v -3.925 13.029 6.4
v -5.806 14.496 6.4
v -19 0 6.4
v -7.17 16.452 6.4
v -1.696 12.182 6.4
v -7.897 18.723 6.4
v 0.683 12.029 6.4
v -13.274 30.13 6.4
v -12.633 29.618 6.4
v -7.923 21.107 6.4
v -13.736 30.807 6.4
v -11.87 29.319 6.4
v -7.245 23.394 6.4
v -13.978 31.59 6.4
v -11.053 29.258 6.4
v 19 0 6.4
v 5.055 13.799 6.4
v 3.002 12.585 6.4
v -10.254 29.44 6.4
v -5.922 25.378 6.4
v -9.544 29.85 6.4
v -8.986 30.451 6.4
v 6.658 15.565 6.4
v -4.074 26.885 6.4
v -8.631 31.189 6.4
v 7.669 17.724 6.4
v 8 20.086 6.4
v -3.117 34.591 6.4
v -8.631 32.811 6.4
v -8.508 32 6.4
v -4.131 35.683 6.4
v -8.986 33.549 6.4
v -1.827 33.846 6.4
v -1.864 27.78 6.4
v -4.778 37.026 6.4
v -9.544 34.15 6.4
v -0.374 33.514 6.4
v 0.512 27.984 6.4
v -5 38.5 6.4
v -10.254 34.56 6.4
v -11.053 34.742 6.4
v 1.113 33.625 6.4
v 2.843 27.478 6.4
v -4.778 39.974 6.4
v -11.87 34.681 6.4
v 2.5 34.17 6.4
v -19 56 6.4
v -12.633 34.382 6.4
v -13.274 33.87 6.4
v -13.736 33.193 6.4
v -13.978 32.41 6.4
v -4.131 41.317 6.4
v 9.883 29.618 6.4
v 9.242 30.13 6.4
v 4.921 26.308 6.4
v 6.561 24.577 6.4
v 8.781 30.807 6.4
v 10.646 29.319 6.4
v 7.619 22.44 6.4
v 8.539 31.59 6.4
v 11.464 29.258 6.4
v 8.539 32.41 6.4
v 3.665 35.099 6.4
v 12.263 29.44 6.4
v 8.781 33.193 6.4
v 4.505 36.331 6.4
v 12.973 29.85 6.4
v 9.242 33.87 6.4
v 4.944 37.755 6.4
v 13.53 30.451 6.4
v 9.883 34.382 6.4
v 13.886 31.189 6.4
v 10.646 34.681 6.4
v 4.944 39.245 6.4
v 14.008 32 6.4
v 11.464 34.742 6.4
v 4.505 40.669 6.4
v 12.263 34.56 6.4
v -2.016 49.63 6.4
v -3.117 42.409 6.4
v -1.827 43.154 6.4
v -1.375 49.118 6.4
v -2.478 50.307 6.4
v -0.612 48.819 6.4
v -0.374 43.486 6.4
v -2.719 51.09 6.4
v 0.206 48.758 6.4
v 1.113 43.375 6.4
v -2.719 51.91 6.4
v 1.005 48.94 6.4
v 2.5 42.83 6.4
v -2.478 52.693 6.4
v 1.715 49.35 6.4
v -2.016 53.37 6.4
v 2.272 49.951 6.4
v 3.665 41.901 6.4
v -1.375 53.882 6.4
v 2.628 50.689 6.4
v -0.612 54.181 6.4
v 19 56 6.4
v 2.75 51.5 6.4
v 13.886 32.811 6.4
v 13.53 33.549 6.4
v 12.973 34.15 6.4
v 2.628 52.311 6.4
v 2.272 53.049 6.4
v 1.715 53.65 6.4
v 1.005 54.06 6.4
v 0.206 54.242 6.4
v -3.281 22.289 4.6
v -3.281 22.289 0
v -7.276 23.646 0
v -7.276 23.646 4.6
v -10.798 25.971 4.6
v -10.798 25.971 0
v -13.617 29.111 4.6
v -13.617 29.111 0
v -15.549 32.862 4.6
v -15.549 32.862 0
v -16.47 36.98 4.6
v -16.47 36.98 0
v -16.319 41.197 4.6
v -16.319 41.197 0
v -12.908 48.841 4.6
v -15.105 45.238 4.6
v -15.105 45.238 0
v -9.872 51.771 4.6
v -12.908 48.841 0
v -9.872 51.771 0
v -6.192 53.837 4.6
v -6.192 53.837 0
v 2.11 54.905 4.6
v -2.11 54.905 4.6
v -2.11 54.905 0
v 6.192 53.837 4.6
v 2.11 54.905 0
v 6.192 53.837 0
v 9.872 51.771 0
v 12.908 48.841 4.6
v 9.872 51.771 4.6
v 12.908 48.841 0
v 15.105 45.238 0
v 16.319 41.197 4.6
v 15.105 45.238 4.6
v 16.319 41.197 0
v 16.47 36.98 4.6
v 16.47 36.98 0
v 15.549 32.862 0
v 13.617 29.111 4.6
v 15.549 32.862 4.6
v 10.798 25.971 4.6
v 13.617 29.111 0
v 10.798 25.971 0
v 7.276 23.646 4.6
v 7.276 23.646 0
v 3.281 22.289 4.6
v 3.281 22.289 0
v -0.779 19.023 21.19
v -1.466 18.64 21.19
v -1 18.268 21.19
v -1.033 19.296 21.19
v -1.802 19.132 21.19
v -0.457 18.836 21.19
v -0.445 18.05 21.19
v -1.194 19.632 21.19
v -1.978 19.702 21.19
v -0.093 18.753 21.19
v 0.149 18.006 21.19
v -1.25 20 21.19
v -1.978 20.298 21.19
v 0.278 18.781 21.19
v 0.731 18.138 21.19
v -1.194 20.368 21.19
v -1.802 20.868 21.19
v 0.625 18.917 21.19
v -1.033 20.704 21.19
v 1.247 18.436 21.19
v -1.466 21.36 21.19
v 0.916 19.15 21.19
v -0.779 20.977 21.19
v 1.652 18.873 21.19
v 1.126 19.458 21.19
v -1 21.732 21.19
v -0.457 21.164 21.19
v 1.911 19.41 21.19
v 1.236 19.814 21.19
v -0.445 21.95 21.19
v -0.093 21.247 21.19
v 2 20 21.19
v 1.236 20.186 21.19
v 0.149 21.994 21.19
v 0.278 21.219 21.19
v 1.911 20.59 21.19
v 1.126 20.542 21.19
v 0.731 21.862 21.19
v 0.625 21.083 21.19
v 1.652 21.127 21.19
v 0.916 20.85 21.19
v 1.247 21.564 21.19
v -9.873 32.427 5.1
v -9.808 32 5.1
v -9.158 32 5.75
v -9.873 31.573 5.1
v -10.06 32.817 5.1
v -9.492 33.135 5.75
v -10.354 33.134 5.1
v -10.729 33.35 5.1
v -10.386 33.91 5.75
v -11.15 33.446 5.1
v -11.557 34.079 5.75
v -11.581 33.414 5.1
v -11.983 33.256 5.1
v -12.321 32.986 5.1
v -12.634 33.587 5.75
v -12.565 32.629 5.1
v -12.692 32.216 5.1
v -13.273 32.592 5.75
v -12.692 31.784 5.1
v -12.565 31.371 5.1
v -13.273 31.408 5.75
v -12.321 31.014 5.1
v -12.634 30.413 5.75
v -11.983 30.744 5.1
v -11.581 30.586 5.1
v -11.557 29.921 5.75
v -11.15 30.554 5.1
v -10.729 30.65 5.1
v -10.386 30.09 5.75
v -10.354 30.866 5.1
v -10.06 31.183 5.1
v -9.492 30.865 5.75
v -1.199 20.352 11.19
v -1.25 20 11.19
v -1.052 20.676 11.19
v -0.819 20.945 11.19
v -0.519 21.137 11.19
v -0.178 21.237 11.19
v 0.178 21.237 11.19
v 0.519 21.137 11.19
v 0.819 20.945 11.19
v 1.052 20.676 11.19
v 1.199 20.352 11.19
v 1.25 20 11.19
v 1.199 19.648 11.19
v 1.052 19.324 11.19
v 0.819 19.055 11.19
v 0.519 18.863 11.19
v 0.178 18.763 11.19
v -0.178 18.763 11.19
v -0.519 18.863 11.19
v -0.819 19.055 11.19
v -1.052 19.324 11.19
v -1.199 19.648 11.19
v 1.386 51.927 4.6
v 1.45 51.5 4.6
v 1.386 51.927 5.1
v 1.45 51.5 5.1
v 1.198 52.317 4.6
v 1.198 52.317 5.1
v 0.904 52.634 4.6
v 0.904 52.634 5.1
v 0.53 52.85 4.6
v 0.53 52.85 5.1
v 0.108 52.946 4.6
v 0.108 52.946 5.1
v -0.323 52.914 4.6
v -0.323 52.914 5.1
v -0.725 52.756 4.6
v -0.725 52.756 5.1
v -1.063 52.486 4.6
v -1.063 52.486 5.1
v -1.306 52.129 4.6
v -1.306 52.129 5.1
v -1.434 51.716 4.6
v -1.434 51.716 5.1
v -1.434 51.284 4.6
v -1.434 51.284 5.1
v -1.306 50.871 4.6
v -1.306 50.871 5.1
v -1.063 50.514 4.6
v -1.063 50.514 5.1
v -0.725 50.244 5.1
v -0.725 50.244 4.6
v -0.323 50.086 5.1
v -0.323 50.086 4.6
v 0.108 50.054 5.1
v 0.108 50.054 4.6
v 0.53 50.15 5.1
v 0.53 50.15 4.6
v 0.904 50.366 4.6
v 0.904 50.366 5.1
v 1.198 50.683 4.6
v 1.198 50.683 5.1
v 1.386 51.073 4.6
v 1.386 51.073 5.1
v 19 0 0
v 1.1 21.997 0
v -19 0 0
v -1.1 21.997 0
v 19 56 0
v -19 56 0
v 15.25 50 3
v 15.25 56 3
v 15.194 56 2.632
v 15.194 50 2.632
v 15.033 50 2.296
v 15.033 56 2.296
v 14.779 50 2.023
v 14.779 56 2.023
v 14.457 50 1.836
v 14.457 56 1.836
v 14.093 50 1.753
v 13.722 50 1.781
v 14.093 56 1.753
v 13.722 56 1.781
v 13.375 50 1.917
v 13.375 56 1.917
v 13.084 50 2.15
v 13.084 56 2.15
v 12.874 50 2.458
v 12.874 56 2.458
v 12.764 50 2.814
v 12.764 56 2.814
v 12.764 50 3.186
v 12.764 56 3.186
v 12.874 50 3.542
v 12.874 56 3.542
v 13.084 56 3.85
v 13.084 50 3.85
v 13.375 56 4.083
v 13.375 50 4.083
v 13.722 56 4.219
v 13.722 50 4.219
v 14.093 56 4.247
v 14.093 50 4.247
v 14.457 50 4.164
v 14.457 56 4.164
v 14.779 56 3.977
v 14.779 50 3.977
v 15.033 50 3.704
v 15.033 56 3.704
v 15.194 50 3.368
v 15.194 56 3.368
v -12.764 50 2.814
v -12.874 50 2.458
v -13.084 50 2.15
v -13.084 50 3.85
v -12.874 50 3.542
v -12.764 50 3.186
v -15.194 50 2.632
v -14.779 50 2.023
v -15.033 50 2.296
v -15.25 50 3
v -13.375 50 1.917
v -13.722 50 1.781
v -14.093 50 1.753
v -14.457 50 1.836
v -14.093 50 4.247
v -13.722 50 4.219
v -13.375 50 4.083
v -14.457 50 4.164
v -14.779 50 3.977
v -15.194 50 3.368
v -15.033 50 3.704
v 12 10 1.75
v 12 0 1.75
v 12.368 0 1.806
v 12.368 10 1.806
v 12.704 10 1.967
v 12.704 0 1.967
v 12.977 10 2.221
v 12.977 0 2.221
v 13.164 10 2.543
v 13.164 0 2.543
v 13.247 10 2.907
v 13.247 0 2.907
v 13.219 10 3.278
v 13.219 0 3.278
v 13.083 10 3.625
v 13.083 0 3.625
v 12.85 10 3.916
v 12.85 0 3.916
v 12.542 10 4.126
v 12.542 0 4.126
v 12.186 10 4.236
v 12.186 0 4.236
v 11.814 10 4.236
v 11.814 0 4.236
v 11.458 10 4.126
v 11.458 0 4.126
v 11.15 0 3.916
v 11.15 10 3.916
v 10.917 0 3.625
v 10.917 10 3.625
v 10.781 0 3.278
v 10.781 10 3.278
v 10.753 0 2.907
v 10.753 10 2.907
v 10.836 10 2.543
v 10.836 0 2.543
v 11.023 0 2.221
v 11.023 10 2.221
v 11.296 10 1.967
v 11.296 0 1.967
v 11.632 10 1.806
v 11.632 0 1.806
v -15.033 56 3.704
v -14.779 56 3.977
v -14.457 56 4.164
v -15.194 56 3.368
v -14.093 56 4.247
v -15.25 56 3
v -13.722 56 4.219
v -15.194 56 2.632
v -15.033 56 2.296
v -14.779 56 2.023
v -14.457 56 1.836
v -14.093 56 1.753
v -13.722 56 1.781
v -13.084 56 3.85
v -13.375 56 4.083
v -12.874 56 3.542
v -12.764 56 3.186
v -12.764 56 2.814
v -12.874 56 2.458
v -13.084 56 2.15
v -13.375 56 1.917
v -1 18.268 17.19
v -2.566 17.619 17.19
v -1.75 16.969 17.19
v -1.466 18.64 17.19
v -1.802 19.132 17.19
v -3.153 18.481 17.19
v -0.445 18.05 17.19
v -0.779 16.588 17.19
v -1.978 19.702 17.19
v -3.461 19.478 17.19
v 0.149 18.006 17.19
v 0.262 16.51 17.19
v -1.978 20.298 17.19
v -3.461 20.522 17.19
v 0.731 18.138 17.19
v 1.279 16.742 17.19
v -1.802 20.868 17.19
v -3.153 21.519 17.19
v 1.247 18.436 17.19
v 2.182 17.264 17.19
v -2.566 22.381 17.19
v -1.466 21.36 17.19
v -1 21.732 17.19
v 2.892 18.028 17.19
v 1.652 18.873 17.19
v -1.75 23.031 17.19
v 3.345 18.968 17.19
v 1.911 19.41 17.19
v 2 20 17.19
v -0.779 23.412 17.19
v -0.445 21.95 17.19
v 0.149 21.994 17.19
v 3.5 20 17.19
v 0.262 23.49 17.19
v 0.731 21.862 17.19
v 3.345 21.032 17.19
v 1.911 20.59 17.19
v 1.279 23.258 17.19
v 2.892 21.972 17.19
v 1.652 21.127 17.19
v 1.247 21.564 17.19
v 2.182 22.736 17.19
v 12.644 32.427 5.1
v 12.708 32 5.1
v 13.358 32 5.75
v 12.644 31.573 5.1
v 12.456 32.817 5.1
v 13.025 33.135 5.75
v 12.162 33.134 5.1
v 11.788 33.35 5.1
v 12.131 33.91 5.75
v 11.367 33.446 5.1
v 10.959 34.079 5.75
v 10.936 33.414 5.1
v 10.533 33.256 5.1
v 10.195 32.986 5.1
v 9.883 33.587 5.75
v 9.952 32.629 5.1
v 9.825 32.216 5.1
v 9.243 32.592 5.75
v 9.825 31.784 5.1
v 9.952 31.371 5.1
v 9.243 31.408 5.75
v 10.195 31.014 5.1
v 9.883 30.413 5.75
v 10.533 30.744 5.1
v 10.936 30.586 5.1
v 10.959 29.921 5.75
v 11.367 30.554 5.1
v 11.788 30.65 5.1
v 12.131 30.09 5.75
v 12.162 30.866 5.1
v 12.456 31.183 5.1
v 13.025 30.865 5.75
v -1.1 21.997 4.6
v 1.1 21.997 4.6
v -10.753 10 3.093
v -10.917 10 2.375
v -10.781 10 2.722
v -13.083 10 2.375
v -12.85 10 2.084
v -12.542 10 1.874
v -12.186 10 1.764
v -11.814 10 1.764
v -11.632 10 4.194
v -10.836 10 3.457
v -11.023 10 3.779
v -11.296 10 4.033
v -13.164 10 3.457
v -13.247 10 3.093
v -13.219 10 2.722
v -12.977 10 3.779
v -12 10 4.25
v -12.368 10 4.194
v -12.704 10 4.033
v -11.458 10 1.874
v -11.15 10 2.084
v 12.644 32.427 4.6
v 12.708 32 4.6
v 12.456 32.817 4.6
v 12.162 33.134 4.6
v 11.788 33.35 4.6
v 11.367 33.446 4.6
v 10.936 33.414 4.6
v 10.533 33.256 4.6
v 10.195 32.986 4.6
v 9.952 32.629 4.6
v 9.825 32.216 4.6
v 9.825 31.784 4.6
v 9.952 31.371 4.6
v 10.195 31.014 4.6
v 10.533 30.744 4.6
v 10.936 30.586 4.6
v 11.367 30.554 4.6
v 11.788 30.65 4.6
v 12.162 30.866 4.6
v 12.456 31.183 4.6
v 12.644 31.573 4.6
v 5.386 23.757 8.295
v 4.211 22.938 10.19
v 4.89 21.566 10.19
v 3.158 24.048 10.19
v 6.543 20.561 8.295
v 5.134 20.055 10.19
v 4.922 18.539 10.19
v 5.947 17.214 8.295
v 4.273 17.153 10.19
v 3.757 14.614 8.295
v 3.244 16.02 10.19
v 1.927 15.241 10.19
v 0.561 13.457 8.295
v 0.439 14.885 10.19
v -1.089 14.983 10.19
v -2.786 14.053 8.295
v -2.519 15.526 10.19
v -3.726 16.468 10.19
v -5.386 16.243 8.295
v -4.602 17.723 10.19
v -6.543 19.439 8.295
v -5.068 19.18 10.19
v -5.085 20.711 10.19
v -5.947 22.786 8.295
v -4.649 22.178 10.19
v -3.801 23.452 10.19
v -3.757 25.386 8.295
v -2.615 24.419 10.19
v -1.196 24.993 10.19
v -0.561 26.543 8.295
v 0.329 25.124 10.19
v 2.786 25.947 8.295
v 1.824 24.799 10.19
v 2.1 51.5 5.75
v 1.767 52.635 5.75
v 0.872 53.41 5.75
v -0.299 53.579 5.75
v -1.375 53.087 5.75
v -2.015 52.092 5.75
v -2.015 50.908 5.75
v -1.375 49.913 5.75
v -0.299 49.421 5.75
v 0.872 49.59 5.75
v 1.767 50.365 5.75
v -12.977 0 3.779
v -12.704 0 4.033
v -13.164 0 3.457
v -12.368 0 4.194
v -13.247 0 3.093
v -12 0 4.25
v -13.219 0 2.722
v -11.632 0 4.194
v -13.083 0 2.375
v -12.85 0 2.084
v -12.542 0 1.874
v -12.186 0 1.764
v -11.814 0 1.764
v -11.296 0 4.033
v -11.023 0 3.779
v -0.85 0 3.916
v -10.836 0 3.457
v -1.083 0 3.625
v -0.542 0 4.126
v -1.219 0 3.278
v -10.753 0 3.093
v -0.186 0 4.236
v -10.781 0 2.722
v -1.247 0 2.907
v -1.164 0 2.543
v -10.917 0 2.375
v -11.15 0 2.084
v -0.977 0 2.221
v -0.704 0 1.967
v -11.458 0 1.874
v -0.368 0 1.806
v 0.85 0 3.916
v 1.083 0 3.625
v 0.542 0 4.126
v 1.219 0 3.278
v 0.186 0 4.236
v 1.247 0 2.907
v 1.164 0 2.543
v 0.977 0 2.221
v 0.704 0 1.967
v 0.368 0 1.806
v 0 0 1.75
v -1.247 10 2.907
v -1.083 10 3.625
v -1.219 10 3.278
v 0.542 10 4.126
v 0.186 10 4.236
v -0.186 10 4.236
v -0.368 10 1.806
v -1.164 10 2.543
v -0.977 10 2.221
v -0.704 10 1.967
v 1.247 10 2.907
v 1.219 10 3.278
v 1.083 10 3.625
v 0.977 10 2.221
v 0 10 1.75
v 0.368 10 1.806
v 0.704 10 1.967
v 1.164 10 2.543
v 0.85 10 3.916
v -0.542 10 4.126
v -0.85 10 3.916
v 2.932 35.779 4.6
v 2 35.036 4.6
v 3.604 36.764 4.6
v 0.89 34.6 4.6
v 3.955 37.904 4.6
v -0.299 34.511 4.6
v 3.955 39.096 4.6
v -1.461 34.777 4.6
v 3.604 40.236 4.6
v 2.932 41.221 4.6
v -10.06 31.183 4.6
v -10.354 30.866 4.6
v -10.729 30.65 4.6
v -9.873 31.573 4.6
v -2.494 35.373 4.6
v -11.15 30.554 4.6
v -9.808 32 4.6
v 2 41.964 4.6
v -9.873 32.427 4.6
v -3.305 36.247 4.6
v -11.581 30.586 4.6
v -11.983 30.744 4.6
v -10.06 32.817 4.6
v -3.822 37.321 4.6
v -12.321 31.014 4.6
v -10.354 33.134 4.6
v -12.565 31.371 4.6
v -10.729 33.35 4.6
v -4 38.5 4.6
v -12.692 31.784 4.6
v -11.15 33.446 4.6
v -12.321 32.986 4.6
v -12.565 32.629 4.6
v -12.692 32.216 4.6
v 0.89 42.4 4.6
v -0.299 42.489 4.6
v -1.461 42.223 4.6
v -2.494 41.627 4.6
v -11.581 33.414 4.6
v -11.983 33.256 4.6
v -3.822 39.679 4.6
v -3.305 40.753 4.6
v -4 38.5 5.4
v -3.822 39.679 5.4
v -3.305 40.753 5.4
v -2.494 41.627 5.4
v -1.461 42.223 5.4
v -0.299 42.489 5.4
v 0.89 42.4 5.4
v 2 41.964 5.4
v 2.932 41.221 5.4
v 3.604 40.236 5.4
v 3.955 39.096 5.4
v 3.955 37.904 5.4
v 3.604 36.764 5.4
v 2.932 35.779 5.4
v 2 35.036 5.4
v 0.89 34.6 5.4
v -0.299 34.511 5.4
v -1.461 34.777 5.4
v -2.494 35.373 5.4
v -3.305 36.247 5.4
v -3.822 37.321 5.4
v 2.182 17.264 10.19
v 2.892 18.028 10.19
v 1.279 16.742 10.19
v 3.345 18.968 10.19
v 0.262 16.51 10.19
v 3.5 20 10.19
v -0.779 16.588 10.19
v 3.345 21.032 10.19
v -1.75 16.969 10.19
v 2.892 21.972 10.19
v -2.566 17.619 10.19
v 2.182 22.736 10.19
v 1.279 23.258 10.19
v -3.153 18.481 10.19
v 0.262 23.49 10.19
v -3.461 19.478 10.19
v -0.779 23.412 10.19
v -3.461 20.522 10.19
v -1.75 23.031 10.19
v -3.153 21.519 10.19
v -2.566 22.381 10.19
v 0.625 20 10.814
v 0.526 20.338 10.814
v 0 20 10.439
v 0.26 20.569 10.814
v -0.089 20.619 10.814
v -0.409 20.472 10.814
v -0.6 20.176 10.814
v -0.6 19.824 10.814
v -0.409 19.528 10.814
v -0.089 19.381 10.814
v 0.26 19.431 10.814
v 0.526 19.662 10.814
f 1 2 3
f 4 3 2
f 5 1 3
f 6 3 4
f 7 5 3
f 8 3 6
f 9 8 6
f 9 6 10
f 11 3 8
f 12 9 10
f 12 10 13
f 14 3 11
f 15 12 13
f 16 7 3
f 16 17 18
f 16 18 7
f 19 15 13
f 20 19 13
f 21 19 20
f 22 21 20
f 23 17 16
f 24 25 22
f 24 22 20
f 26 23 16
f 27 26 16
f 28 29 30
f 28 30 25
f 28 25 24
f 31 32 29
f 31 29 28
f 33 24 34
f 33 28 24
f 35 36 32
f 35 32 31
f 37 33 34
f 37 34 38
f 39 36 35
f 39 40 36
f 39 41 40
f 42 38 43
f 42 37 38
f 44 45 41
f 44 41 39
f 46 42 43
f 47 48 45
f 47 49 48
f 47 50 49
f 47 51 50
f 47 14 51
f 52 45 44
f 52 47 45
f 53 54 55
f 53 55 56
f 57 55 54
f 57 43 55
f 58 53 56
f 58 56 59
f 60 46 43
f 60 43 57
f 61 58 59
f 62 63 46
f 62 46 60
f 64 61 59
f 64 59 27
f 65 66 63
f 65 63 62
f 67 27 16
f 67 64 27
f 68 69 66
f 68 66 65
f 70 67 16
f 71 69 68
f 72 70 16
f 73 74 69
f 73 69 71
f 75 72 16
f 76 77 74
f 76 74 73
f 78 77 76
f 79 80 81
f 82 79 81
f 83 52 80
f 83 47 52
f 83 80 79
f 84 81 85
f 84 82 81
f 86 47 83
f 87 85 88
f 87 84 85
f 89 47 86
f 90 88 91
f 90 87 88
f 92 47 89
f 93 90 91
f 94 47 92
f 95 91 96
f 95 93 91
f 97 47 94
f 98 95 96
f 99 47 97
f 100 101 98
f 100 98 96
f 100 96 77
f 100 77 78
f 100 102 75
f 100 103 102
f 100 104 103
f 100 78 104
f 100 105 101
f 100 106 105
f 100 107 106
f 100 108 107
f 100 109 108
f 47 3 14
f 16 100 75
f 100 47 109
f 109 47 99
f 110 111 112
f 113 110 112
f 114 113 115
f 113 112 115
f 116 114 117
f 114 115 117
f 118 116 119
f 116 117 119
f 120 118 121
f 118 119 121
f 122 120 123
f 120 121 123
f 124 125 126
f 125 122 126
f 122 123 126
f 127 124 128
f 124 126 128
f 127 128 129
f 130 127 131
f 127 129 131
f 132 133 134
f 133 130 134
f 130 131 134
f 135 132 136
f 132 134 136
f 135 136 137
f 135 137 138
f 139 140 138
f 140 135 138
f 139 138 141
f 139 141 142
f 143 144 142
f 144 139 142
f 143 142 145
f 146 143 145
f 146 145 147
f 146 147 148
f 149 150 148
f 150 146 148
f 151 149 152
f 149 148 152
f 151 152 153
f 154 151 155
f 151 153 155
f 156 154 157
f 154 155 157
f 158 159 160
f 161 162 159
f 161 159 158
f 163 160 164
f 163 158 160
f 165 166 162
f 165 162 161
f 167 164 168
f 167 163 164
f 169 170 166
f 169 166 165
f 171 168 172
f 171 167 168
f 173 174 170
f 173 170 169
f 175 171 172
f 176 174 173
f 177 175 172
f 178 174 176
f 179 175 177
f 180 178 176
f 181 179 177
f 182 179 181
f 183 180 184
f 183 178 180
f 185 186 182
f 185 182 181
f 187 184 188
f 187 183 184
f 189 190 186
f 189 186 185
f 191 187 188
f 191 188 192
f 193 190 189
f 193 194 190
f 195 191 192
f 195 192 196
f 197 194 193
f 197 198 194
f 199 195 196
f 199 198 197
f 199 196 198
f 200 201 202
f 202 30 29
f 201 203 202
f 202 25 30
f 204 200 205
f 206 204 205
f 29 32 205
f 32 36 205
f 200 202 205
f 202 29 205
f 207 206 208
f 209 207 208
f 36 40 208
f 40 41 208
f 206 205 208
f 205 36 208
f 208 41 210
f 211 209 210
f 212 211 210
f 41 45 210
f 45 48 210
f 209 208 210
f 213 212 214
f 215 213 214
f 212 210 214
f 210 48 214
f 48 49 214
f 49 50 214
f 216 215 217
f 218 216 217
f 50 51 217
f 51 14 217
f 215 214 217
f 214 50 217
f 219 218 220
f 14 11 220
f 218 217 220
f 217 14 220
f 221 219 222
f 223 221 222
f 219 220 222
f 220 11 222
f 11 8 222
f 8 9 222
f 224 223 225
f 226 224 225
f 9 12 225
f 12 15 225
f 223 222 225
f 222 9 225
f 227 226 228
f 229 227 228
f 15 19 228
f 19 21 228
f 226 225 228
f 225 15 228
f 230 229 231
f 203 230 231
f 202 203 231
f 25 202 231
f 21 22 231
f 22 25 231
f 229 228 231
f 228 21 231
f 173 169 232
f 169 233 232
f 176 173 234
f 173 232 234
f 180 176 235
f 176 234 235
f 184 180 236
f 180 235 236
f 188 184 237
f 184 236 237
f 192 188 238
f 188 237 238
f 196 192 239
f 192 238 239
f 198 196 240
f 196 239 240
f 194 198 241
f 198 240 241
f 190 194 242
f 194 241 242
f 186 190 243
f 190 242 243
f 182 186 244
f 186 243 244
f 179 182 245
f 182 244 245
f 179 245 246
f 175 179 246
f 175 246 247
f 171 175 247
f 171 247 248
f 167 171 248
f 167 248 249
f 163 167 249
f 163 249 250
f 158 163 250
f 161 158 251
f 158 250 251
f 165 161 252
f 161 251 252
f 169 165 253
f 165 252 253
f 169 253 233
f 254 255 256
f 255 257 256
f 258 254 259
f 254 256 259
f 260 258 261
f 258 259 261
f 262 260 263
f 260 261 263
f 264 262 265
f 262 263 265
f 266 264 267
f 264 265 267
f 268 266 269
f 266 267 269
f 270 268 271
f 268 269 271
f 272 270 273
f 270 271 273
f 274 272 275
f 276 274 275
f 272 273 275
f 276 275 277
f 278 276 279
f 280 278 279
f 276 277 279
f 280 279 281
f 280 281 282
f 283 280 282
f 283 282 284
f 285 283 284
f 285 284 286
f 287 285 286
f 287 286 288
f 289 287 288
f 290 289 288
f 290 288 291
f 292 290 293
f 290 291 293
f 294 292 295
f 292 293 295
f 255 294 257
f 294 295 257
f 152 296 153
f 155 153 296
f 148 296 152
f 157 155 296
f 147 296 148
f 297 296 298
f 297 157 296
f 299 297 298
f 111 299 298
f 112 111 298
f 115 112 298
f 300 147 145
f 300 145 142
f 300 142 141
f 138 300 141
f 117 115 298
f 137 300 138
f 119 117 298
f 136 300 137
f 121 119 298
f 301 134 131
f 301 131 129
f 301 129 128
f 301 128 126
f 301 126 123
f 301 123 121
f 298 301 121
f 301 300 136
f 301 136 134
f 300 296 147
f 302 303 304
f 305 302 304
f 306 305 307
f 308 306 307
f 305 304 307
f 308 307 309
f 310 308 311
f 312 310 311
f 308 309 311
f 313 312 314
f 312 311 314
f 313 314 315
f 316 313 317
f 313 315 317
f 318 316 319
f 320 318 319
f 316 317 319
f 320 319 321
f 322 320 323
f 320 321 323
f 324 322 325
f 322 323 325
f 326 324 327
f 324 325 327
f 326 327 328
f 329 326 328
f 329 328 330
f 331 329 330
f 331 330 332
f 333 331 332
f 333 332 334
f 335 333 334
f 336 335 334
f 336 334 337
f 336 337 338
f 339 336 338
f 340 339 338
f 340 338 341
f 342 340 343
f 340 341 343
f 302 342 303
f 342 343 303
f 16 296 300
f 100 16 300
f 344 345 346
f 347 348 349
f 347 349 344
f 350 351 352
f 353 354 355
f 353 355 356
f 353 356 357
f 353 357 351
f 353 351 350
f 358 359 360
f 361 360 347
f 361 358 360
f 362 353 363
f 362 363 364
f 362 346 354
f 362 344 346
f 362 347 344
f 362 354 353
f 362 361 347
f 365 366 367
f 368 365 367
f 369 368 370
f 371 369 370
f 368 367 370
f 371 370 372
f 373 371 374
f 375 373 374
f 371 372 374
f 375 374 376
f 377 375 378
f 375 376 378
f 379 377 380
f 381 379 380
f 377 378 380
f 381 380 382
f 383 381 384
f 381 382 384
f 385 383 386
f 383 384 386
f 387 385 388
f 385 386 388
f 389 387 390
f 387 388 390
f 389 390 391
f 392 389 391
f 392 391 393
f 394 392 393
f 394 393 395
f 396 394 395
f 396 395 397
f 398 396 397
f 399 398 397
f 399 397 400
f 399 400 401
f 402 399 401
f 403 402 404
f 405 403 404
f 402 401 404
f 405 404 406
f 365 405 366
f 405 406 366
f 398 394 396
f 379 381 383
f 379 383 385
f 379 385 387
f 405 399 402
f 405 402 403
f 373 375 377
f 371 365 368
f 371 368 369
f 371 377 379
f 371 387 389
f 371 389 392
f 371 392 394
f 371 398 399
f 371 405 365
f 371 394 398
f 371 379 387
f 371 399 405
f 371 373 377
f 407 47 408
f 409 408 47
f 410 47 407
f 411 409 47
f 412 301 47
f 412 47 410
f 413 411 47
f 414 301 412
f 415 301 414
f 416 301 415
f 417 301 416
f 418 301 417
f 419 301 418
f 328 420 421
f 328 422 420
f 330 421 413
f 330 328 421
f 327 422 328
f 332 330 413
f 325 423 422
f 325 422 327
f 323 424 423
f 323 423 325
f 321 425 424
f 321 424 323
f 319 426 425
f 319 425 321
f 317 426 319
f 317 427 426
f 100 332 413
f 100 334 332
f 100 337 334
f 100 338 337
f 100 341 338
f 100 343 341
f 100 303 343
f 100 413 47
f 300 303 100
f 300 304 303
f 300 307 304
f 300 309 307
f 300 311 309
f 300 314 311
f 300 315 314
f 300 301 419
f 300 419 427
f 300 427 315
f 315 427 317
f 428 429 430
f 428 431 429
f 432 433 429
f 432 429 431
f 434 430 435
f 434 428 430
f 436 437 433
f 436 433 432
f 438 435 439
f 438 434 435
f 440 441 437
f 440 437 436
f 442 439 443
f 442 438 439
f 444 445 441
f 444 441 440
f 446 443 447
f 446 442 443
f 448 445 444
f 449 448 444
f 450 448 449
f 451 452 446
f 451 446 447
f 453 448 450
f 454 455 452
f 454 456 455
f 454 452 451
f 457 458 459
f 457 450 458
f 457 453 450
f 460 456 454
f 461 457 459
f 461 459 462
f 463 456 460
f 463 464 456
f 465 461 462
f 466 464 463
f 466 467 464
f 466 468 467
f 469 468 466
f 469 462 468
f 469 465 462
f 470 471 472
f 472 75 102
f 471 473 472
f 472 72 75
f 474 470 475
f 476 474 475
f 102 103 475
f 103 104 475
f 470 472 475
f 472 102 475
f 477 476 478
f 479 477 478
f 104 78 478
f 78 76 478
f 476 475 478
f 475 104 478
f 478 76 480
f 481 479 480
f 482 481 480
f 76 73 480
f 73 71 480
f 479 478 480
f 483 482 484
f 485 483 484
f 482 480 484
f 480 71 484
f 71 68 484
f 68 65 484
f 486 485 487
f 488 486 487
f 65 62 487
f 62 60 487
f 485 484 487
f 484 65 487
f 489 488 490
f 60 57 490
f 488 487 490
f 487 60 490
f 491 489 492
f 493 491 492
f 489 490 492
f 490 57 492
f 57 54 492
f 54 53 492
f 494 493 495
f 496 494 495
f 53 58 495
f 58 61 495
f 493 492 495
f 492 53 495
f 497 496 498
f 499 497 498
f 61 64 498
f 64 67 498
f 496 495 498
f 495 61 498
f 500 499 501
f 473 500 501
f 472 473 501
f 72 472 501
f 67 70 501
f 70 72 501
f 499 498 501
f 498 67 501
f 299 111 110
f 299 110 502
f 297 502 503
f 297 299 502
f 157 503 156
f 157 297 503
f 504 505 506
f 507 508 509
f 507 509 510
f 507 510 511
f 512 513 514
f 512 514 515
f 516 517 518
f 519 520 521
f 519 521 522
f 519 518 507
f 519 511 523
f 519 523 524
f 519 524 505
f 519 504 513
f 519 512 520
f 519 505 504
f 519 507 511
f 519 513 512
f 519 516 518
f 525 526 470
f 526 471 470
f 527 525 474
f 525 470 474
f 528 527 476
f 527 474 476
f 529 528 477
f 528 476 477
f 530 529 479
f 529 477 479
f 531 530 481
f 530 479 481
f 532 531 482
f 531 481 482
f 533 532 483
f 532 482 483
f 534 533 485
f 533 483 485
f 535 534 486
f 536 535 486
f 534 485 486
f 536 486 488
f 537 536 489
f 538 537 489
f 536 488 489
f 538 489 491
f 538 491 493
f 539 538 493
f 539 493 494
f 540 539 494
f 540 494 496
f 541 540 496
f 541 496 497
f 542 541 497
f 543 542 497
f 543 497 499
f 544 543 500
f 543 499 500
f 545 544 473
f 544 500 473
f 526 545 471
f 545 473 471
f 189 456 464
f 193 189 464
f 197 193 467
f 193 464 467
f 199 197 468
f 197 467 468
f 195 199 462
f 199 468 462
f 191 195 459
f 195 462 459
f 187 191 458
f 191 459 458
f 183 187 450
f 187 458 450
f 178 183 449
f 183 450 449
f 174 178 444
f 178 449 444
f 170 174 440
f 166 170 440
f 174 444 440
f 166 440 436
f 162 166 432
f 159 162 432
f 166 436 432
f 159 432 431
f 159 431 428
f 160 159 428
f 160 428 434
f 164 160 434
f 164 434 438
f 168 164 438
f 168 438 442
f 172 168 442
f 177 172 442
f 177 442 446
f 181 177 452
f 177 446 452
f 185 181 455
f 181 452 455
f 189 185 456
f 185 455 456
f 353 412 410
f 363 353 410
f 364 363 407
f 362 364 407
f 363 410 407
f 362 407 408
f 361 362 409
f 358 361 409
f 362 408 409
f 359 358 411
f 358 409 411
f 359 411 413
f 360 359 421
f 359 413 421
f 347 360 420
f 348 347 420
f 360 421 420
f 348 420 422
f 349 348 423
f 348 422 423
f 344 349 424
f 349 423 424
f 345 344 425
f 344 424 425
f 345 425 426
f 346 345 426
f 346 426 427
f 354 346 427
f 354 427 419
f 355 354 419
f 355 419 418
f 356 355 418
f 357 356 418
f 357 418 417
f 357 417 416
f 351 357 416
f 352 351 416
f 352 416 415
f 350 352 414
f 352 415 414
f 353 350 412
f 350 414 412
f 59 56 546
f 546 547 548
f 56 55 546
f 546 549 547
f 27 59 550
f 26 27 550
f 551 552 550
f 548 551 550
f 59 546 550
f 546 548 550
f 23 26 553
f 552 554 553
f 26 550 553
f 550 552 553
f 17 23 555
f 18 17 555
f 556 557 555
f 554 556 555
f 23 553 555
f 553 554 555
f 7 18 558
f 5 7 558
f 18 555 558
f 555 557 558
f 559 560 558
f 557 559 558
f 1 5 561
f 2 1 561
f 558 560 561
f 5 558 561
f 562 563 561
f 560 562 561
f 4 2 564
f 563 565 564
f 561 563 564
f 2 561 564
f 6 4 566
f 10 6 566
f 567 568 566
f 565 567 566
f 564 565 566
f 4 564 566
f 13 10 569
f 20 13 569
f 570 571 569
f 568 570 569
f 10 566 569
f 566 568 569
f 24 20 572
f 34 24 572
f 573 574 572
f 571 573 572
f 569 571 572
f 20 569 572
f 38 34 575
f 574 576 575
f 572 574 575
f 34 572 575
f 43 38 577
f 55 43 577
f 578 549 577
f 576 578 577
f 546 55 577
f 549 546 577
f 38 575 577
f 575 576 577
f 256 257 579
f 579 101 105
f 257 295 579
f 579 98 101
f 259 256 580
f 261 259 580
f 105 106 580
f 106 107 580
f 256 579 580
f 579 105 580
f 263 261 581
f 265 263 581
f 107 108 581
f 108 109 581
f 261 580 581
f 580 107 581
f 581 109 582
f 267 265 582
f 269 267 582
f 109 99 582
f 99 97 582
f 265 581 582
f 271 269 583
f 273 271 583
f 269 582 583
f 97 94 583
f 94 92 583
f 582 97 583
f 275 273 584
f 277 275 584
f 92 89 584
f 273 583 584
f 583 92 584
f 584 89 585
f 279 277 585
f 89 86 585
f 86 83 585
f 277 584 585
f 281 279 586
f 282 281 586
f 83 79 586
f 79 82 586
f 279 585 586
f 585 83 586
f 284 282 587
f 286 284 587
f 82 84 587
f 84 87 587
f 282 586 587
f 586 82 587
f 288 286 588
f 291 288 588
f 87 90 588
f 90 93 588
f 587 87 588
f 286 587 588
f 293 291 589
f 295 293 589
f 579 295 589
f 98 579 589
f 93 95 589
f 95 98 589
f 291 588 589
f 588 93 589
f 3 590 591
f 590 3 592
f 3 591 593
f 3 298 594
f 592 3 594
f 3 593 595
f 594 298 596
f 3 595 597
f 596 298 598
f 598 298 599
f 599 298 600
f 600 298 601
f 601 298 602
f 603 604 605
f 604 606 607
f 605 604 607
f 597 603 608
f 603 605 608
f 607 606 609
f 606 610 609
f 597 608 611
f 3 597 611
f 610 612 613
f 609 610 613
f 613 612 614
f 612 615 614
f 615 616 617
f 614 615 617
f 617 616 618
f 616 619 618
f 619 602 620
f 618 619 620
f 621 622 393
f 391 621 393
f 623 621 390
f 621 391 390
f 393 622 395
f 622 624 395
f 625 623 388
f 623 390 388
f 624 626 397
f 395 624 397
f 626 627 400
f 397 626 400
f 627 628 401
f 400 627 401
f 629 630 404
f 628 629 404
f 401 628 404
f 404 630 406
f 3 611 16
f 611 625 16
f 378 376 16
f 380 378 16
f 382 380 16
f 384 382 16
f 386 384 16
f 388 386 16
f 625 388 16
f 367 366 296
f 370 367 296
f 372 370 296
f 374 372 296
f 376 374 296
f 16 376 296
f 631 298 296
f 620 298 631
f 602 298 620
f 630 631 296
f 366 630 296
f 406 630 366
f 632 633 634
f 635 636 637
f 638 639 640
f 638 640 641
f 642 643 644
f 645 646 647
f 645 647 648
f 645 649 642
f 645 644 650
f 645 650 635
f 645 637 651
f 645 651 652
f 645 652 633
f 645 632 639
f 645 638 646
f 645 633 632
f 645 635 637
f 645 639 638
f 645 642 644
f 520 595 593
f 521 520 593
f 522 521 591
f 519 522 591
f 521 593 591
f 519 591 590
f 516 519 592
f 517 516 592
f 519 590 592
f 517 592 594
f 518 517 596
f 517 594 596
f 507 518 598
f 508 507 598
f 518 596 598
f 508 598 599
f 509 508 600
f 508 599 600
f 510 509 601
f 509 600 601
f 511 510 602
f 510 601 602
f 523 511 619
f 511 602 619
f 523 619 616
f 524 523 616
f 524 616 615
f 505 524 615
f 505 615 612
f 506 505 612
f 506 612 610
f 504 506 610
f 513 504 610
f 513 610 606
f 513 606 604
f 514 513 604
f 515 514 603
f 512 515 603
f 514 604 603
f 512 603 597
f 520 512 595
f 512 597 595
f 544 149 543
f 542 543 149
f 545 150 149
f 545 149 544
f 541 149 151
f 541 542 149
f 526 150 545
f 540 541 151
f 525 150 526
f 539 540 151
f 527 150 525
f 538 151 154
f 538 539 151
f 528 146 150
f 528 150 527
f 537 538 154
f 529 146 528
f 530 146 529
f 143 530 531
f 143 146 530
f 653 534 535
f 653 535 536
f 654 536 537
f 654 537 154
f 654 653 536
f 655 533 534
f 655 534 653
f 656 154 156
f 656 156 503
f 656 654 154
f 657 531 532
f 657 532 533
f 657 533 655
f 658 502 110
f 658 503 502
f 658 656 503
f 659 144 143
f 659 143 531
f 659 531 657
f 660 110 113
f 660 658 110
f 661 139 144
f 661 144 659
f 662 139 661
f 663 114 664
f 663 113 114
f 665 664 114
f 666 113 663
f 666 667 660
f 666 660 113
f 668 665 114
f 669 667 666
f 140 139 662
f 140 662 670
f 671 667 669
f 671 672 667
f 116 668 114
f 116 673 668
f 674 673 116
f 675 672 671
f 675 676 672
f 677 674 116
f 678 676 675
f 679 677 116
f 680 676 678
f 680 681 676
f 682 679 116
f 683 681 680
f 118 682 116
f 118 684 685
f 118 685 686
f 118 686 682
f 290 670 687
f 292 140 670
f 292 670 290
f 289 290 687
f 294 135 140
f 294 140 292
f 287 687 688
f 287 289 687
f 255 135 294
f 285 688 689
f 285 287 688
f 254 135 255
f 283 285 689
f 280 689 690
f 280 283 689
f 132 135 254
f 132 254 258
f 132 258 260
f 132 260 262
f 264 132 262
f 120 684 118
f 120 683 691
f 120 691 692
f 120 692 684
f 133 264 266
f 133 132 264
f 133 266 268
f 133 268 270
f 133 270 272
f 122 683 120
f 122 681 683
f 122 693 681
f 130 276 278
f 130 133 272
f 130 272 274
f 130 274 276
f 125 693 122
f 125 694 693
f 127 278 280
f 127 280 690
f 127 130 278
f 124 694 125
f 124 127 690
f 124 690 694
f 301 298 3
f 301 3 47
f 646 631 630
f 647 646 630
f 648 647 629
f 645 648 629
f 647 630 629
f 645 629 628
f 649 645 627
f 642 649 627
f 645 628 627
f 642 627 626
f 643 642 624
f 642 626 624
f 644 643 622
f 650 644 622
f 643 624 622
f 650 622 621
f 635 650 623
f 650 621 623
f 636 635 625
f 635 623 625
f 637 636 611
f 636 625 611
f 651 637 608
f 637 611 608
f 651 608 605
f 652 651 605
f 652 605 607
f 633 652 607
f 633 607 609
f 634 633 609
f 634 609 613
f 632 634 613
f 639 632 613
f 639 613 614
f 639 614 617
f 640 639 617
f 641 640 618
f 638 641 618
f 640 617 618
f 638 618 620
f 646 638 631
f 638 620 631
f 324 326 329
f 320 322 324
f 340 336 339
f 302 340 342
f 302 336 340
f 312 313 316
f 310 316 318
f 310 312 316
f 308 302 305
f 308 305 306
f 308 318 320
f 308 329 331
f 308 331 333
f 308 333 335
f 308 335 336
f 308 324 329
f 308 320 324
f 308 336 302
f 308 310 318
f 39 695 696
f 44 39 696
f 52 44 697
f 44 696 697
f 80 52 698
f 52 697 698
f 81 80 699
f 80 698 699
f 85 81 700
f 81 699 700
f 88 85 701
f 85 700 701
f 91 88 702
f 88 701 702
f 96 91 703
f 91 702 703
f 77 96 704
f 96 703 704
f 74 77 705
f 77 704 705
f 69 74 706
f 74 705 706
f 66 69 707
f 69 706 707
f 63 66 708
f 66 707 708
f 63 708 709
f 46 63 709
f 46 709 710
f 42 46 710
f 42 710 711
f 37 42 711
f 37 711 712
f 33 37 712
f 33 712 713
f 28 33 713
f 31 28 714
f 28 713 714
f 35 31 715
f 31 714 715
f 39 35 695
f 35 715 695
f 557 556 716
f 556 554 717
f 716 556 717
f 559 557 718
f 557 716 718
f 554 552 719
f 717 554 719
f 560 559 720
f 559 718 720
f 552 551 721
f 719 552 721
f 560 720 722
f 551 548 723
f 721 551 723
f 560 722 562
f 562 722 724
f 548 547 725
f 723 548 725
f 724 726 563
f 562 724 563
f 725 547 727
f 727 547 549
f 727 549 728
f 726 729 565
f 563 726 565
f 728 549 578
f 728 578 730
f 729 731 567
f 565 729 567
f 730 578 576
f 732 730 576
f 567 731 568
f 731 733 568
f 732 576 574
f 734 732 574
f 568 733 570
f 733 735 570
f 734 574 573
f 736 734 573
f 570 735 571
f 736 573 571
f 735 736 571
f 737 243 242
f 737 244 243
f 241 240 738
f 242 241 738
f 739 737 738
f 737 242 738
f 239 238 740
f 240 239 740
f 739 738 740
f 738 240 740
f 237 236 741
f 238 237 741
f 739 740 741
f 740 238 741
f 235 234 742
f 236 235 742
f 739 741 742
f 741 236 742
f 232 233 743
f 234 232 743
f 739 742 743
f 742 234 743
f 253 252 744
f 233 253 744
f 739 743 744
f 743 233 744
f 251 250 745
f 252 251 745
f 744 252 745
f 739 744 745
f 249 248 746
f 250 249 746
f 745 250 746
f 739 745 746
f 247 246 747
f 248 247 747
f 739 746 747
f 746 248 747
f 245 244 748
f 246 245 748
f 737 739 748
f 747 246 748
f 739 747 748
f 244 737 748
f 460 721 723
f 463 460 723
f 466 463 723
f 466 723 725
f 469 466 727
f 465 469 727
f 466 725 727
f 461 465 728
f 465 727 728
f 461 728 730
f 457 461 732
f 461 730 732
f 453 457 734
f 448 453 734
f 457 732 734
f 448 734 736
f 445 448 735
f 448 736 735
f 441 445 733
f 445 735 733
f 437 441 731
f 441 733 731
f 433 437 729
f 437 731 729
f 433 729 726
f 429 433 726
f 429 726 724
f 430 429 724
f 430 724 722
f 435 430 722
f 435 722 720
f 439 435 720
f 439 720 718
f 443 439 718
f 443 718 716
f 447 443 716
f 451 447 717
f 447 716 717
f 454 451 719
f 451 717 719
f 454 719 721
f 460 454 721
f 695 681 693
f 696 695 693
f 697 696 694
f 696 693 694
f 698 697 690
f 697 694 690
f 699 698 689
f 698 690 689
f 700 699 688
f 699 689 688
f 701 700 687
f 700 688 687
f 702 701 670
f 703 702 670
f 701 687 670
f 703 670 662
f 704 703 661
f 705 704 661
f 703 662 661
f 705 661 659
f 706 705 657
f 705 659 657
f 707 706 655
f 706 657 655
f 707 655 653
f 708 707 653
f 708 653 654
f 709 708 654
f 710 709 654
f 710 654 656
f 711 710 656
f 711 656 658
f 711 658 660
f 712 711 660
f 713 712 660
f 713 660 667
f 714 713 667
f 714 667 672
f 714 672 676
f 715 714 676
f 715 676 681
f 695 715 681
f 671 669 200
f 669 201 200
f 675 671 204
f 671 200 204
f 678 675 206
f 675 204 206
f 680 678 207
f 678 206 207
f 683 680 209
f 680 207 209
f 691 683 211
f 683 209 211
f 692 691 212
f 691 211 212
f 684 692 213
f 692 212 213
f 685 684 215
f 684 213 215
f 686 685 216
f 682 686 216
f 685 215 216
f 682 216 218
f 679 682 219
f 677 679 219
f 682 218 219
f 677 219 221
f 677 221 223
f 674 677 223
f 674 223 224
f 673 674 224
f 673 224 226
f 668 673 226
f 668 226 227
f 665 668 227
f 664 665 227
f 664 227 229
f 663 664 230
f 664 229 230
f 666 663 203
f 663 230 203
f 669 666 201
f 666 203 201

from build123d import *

# Parameters (mm, degrees)
ESBO_O1_W                     = 38
ESBO_O1_H                     = 56
ESBO_O1_R                     = 4
RESSALTO_EXTRUS_O1_DEPTH      = 6.4
ESBO_O6_R                     = 16.54
CORTE_EXTRUS_O5_DEPTH         = 4.6
ESBO_O7_R                     = 4
ESBO_O7_R_2                   = 1.25
CORTE_EXTRUS_O6_DEPTH         = 60.314079273
RESSALTO_EXTRUS_O2_DEPTH      = 4.6
RESSALTO_EXTRUS_O3_DEPTH      = 5.59
ESBO_O17_R                    = 3.5
RESSALTO_EXTRUS_O4_DEPTH      = 7
ESBO_O18_R                    = 2
RESSALTO_EXTRUS_O5_DEPTH      = 4
CHANFRO1_SIZE                 = 4
CHANFRO1_SIZE_2               = 5.29
FURO_ROSCADO_DE_M3X0_51_D     = 2.5
FURO_ROSCADO_DE_M3X0_51_DEPTH = 10
FURO_ROSCADO_DE_M3X0_51_TIP   = 0.751075774
CHANFRO2_SIZE                 = 1
SKETCH1_R                     = 1.25
CUT_EXTRUDE1_DEPTH            = 6
SKETCH2_R                     = 1.25
CUT_EXTRUDE2_DEPTH            = 10


# Read off the part's stored shape, not the designer's step: Escareado para parafuso de máquina com cabeça chata de M2.51
with BuildPart() as part:
    # Esboço1 → Ressalto-extrusão1 (new body)
    with BuildSketch(Plane.XY):
        with Locations((0, 28)):
            Rectangle(ESBO_O1_W, ESBO_O1_H)
        with Locations((0, 20)):
            Circle(ESBO_O1_R, mode=Mode.SUBTRACT)
    extrude(amount=RESSALTO_EXTRUS_O1_DEPTH)

    # Esboço6 → Corte-extrusão5 (cut)
    with BuildSketch(Plane(origin=(0, 0, 0), x_dir=(-1, 0, 0), z_dir=(0, 0, -1))):
        with Locations((0, 38.5)):
            Circle(ESBO_O6_R)
    extrude(amount=-CORTE_EXTRUS_O5_DEPTH, mode=Mode.SUBTRACT)

    # Esboço7 → Corte-extrusão6 (cut, through all)
    with BuildSketch(Plane(origin=(0, 0, 4.6), x_dir=(-1, 0, 0), z_dir=(0, 0, -1))):
        with Locations((0, 38.5)):
            Circle(ESBO_O7_R)
        with Locations((11.258330249, 32)):
            Circle(ESBO_O7_R_2)
        with Locations((-11.258330249, 32)):
            Circle(ESBO_O7_R_2)
        with Locations((0, 51.5)):
            Circle(ESBO_O7_R_2)
    extrude(amount=-CORTE_EXTRUS_O6_DEPTH, mode=Mode.SUBTRACT)

    # Escareado para parafuso de m_quina c 2 → Escareado para parafuso de máquina com cabeça chata de M2.51 (revolve, cut)
    with BuildSketch(Plane(origin=(-11.258330249, 32, 0), x_dir=(1, 0, 0), z_dir=(0, -1, 0))):
        Polygon((1.25, 4.6), (1.45, 4.6), (1.45, 5.1), (2.75, 6.4), (1.25, 6.4), align=None)
    revolve(axis=Axis((-11.258330249, 32, 0), (0, 0, 1)), mode=Mode.SUBTRACT)

    # Escareado para parafuso de m_quina c 3 o → Escareado para parafuso de m_quina c 3 (revolve, cut)
    with BuildSketch(Plane(origin=(11.258330249, 32, 0), x_dir=(1, 0, 0), z_dir=(0, -1, 0))):
        Polygon((1.25, 4.6), (1.45, 4.6), (1.45, 5.1), (2.75, 6.4), (1.25, 6.4), align=None)
    revolve(axis=Axis((11.258330249, 32, 0), (0, 0, 1)), mode=Mode.SUBTRACT)

    # Escareado para parafuso de m_quina c 4 o → Escareado para parafuso de m_quina c 4 (revolve, cut)
    with BuildSketch(Plane.XZ.offset(-51.5)):
        Polygon((1.25, 4.6), (1.45, 4.6), (1.45, 5.1), (2.75, 6.4), (1.25, 6.4), align=None)
    revolve(axis=Axis((0, 51.5, 0), (0, 0, 1)), mode=Mode.SUBTRACT)

    # Esboço15 → Ressalto-extrusão2 (add)
    with BuildSketch(Plane(origin=(0, 0, 0), x_dir=(-1, 0, 0), z_dir=(0, 0, -1))):
        with BuildLine():
            ThreePointArc((-3.280592218, 22.288605405), (0, 16), (3.280592218, 22.288605405))
            ThreePointArc((3.280592218, 22.288605405), (0, 21.96), (-3.280592218, 22.288605405))
        make_face()
    extrude(amount=-RESSALTO_EXTRUS_O2_DEPTH)

    # Esboço16 → Ressalto-extrusão3 (add)
    with BuildSketch(Plane.XY.offset(4.6)):
        with BuildLine():
            ThreePointArc((-3.280592218, 22.288605405), (0, 16), (3.280592218, 22.288605405))
            ThreePointArc((3.280592218, 22.288605405), (0, 24), (-3.280592218, 22.288605405))
        make_face()
    extrude(amount=RESSALTO_EXTRUS_O3_DEPTH)

    # Esboço17 → Ressalto-extrusão4 (add)
    with BuildSketch(Plane.XY.offset(10.19)):
        with Locations((0, 20)):
            Circle(ESBO_O17_R)
    extrude(amount=RESSALTO_EXTRUS_O4_DEPTH)

    # Esboço18 → Ressalto-extrusão5 (add)
    with BuildSketch(Plane.XY.offset(17.19)):
        with Locations((0, 20)):
            Circle(ESBO_O18_R)
    extrude(amount=RESSALTO_EXTRUS_O5_DEPTH)

    # Chanfro1
    # the kernel refuses this chamfer: 5.29, 4 mm, written as the material it adds along each edge
    with BuildSketch(Plane(origin=(0, 20, 6.4), x_dir=(0.8201480544065356, 0.5721513513513485, 0), z_dir=(-0.5721513513513485, 0.8201480544065356, 0))) as chanfro1_piece_1_section:
        Polygon((4 + CHANFRO1_SIZE, 0), (4, -CHANFRO1_SIZE_2), (4, 0), align=None)
    chanfro1_piece_1 = revolve(axis=Axis((0, 20, 6.4), (0, 0, -1)), mode=Mode.PRIVATE)
    chanfro1_piece_1 = split(chanfro1_piece_1, bisect_by=Plane(origin=(-5.391672128, 16.238663888, 10.19), z_dir=(0, 0, -1)), keep=Keep.TOP, mode=Mode.PRIVATE)
    add(chanfro1_piece_1)

    # Furo roscado de M3x0.51
    with Locations(Plane.XY.offset(21.19)):
        with Locations((0, 20)):
            Hole(FURO_ROSCADO_DE_M3X0_51_D / 2, depth=FURO_ROSCADO_DE_M3X0_51_DEPTH)
            with Locations((0, 0, -(FURO_ROSCADO_DE_M3X0_51_DEPTH + FURO_ROSCADO_DE_M3X0_51_TIP / 2))):  # 118° drill point
                Cone(0, FURO_ROSCADO_DE_M3X0_51_D / 2, FURO_ROSCADO_DE_M3X0_51_TIP, mode=Mode.SUBTRACT)

    # Chanfro2
    chanfro2_edges = [part.edges().sort_by_distance(p)[0] for p in [
        (4, 38.5, 6.4),
    ]]
    chamfer(chanfro2_edges, length=CHANFRO2_SIZE)

    # Sketch1 → Cut-Extrude1 (cut)
    with BuildSketch(Plane(origin=(0, 56, 0), x_dir=(1, 0, 0), z_dir=(0, 1, 0))):
        with Locations(Location((-14, -3, 0), (0, 0, 180))):
            Circle(SKETCH1_R)
        with Locations((14, -3)):
            Circle(SKETCH1_R)
    extrude(amount=-CUT_EXTRUDE1_DEPTH, mode=Mode.SUBTRACT)

    # Sketch2 → Cut-Extrude2 (cut)
    with BuildSketch(Plane(origin=(0, 0, 0), x_dir=(-1, 0, 0), z_dir=(0, -1, 0))):
        with Locations(Location((-12, -3, 0), (0, 0, 90))):
            Circle(SKETCH2_R)
        with Locations(Location((0, -3, 0), (0, 0, 90))):
            Circle(SKETCH2_R)
        with Locations(Location((12, -3, 0), (0, 0, 270))):
            Circle(SKETCH2_R)
    extrude(amount=-CUT_EXTRUDE2_DEPTH, mode=Mode.SUBTRACT)


solid = part.part
